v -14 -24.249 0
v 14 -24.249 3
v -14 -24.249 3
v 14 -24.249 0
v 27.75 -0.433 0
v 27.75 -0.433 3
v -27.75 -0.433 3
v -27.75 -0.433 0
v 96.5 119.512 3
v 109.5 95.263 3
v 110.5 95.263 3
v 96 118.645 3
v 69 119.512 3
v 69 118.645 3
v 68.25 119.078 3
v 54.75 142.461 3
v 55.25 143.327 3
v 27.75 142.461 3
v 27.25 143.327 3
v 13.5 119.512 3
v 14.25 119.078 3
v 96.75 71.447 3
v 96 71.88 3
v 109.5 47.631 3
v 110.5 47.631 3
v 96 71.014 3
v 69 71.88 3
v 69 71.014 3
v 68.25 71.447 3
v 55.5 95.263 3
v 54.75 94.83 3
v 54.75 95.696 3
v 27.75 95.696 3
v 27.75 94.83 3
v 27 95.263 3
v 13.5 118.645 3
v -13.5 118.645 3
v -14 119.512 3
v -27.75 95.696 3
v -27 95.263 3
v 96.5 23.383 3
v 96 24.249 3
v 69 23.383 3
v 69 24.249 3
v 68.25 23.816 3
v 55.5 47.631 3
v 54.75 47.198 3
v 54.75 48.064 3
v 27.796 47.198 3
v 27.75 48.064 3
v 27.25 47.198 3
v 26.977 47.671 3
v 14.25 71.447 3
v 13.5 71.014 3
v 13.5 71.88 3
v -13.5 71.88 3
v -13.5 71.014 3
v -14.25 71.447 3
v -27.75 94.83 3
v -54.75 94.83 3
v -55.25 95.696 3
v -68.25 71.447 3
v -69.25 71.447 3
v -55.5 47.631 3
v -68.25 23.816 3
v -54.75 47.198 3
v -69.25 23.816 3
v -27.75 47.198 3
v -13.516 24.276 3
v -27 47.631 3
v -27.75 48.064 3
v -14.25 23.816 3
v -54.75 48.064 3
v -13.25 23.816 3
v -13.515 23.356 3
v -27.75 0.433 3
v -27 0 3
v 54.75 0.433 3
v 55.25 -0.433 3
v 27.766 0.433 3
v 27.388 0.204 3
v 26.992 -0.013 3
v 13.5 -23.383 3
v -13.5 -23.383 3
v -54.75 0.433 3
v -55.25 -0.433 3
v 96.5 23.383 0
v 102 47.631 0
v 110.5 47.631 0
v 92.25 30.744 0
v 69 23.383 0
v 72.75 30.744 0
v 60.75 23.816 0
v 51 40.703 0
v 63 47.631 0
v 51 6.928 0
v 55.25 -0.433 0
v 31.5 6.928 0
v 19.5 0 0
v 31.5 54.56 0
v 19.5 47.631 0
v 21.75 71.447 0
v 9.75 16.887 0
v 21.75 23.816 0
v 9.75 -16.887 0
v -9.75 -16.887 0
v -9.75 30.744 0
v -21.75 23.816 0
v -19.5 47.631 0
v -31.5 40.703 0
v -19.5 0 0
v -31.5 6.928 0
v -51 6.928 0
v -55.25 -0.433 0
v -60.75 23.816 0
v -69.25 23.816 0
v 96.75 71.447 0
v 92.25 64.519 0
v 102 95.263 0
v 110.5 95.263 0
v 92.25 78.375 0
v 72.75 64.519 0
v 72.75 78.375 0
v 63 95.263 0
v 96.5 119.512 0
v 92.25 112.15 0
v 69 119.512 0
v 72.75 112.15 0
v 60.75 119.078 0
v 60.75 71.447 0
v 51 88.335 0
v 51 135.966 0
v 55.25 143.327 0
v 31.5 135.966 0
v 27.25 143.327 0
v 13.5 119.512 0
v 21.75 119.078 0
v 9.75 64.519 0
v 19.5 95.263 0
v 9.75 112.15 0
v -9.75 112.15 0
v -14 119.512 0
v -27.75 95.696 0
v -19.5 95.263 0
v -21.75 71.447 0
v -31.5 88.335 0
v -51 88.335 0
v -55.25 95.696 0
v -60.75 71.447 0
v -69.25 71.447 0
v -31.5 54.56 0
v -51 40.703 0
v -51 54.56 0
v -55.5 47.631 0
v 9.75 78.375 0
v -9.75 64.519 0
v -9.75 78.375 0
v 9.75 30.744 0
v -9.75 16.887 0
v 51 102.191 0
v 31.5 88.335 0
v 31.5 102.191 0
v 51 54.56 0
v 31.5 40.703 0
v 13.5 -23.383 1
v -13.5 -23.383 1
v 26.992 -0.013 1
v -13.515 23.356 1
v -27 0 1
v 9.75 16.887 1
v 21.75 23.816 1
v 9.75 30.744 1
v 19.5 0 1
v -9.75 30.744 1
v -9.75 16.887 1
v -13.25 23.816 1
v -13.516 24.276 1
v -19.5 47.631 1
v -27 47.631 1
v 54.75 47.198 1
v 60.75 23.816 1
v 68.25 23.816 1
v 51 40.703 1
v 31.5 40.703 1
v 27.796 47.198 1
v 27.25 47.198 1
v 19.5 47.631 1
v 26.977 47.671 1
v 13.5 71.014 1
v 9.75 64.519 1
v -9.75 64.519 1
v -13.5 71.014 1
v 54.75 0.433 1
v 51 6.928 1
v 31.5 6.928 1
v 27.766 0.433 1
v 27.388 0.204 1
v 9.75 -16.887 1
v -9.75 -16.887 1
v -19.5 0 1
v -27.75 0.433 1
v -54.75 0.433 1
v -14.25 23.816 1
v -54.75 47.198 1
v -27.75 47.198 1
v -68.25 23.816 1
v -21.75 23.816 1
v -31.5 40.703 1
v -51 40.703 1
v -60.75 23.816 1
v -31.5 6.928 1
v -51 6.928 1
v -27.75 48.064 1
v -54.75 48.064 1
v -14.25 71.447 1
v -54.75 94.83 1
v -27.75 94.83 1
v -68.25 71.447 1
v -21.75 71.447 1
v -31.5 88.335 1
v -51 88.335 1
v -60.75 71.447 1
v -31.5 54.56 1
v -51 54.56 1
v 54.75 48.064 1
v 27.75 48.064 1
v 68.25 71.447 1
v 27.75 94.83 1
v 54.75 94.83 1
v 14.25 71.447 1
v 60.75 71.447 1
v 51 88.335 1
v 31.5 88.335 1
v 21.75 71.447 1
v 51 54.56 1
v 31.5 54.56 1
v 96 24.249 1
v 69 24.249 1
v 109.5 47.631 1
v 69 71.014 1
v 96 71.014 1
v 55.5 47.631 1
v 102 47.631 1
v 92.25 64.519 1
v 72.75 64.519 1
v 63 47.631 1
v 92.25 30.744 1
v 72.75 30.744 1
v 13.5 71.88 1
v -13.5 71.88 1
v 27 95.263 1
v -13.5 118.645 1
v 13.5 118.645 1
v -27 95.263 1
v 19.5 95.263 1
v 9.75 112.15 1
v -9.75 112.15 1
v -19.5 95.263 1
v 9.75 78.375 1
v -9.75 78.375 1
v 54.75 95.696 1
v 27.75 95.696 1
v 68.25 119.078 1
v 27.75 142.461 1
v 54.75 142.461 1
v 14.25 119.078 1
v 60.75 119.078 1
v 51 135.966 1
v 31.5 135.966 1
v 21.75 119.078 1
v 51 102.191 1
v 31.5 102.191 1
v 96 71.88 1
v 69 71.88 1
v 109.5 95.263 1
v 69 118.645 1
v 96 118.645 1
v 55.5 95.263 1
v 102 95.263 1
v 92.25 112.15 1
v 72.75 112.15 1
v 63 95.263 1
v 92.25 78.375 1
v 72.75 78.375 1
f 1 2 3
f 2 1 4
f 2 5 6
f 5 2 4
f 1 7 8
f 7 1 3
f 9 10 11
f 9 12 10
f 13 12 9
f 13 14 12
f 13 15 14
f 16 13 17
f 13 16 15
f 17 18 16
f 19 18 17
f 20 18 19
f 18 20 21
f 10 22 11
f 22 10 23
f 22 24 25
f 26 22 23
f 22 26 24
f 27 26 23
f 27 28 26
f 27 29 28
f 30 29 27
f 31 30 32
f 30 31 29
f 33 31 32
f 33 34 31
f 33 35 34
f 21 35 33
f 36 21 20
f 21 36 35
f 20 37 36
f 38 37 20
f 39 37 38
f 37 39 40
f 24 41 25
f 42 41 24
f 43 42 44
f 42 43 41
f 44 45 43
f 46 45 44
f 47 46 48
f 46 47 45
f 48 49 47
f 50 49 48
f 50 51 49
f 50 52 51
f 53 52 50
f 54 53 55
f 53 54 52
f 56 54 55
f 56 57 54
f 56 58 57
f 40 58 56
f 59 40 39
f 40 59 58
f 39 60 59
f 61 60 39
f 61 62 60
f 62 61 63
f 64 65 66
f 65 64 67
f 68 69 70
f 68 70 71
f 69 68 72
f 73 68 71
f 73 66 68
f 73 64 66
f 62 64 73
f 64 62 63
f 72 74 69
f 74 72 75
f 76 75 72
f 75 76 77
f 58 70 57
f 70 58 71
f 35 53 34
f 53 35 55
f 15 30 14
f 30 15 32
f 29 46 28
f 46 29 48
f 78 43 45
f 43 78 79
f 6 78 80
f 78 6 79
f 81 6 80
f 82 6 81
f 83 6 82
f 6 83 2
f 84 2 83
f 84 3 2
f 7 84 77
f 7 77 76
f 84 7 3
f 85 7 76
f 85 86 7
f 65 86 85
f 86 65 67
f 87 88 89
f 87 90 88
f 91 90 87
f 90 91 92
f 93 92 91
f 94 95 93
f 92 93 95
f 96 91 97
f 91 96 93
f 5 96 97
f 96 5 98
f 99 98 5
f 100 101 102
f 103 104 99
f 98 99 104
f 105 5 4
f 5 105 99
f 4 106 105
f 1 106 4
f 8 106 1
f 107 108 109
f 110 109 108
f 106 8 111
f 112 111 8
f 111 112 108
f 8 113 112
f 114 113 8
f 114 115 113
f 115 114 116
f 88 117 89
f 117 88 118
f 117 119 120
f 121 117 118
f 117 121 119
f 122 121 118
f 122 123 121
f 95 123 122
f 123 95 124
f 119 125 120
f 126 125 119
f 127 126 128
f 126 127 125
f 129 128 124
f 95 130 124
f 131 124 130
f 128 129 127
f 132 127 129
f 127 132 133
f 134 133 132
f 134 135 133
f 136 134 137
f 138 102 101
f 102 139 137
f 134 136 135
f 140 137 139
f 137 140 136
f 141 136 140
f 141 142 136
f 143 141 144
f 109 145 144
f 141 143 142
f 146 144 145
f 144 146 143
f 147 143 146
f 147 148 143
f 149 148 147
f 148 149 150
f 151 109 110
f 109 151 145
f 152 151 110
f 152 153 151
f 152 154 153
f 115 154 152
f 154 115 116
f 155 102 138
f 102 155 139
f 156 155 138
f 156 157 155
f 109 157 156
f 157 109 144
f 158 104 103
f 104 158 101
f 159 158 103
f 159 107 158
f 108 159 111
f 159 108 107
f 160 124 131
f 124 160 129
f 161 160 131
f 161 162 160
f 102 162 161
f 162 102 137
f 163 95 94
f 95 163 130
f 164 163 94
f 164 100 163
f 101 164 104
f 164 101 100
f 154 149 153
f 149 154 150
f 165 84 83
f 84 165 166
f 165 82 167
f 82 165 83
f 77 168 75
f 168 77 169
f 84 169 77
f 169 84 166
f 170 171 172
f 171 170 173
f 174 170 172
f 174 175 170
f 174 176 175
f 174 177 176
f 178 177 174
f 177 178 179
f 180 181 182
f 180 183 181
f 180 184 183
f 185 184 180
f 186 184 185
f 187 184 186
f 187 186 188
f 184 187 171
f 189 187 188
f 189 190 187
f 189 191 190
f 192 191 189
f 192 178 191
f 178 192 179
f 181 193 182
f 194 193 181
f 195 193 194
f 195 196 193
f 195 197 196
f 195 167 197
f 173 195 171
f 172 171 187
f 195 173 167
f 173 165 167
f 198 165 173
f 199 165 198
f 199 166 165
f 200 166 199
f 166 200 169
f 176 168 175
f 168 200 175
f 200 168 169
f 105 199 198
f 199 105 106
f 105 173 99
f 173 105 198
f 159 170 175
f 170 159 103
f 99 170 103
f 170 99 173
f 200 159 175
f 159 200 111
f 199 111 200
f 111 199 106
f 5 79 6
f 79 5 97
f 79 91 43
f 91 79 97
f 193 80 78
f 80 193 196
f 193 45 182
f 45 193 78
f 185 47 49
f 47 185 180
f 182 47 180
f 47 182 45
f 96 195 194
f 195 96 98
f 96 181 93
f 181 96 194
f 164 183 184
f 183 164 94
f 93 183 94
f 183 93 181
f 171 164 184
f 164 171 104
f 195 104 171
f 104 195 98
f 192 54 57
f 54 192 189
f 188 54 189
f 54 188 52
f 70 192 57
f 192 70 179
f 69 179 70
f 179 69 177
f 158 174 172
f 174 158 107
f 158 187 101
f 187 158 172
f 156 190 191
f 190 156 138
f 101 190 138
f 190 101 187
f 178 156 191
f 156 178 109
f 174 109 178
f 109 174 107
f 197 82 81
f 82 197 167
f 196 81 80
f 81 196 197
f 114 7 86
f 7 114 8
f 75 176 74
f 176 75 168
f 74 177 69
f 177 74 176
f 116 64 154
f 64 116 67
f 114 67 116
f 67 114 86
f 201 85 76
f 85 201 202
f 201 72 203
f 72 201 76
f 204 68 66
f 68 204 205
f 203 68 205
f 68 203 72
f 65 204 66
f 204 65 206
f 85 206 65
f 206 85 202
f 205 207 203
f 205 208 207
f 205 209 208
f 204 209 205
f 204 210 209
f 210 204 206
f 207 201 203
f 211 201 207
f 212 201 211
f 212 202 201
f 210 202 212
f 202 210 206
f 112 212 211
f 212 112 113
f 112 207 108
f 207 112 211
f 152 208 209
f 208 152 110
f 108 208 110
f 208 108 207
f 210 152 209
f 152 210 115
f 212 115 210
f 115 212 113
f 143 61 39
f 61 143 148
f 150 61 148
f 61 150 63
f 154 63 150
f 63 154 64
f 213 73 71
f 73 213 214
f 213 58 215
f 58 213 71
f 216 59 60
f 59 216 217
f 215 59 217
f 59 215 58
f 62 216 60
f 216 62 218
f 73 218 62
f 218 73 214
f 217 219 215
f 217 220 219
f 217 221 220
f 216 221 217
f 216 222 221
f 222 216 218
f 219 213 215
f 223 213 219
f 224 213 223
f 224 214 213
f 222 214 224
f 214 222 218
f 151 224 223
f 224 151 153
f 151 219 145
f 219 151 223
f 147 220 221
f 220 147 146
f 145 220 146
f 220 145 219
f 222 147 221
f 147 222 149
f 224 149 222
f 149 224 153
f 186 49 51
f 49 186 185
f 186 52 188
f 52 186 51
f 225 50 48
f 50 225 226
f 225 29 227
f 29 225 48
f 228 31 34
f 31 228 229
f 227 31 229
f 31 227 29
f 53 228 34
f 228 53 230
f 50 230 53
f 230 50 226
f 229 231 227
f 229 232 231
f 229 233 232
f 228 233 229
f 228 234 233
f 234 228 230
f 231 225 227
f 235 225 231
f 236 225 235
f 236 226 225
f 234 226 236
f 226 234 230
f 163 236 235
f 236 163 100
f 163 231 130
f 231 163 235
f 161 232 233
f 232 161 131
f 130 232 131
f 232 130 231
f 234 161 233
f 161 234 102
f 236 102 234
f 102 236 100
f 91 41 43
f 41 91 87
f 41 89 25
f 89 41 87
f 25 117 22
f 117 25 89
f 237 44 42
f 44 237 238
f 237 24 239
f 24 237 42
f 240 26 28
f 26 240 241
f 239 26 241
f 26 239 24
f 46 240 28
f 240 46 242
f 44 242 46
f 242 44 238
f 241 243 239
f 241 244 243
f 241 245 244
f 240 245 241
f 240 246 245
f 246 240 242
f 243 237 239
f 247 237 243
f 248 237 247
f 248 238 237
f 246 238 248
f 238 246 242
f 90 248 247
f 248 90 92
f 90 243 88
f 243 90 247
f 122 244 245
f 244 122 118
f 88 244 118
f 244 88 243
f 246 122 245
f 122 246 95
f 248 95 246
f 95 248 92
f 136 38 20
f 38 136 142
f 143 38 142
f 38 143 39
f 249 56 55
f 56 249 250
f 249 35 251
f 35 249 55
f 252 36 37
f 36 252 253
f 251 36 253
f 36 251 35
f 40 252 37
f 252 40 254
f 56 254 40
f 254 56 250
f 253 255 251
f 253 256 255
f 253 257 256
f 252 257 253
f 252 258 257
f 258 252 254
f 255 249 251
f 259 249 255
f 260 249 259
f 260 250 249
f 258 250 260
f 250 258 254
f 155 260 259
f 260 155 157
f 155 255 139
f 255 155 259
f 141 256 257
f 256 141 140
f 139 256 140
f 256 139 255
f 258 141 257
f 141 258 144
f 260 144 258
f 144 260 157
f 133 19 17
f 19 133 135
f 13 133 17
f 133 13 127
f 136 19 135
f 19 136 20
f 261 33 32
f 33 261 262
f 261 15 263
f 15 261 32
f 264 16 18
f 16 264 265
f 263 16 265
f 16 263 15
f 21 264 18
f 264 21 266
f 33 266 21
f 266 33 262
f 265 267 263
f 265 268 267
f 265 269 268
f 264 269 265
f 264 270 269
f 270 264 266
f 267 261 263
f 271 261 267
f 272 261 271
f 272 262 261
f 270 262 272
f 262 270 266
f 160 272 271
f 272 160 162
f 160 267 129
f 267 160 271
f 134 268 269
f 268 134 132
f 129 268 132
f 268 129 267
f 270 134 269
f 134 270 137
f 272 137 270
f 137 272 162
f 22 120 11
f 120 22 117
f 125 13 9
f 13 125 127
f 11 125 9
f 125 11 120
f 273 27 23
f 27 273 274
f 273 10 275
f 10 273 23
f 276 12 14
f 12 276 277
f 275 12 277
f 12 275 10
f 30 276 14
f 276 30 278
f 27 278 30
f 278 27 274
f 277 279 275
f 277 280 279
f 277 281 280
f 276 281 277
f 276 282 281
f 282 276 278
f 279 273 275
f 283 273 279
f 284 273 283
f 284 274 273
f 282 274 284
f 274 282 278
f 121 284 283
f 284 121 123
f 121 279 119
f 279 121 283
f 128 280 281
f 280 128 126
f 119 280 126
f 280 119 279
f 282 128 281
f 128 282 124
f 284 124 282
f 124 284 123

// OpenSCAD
$fn = 150;

union() {
	difference() {
		union() {
			translate(v = [0.0, 0.0, 0]) {
				difference() {
					cylinder($fn = 6, d = 56.0, h = 3.0);
					translate(v = [0, 0, 1.0]) {
						cylinder($fn = 6, d = 54.0, h = 3.0);
					}
					translate(v = [0, 0, -1]) {
						cylinder($fn = 6, d = 39, h = 3.0);
					}
				}
			}
			translate(v = [41.25, 23.81569860407206, 0]) {
				difference() {
					cylinder($fn = 6, d = 56.0, h = 3.0);
					translate(v = [0, 0, 1.0]) {
						cylinder($fn = 6, d = 54.0, h = 3.0);
					}
					translate(v = [0, 0, -1]) {
						cylinder($fn = 6, d = 39, h = 3.0);
					}
				}
			}
			translate(v = [0.0, 47.63139720814412, 0]) {
				difference() {
					cylinder($fn = 6, d = 56.0, h = 3.0);
					translate(v = [0, 0, 1.0]) {
						cylinder($fn = 6, d = 54.0, h = 3.0);
					}
					translate(v = [0, 0, -1]) {
						cylinder($fn = 6, d = 39, h = 3.0);
					}
				}
			}
		}
		translate(v = [13.75, 23.824673200287624, 1.0]) {
			cylinder(d = 54.55, h = 3.0);
		}
	}
	translate(v = [-41.25, 23.81569860407206, 0]) {
		difference() {
			cylinder($fn = 6, d = 56.0, h = 3.0);
			translate(v = [0, 0, 1.0]) {
				cylinder($fn = 6, d = 54.0, h = 3.0);
			}
			translate(v = [0, 0, -1]) {
				cylinder($fn = 6, d = 39, h = 3.0);
			}
		}
	}
	translate(v = [-41.25, 71.44709581221619, 0]) {
		difference() {
			cylinder($fn = 6, d = 56.0, h = 3.0);
			translate(v = [0, 0, 1.0]) {
				cylinder($fn = 6, d = 54.0, h = 3.0);
			}
			translate(v = [0, 0, -1]) {
				cylinder($fn = 6, d = 39, h = 3.0);
			}
		}
	}
	translate(v = [41.25, 71.44709581221619, 0]) {
		difference() {
			cylinder($fn = 6, d = 56.0, h = 3.0);
			translate(v = [0, 0, 1.0]) {
				cylinder($fn = 6, d = 54.0, h = 3.0);
			}
			translate(v = [0, 0, -1]) {
				cylinder($fn = 6, d = 39, h = 3.0);
			}
		}
	}
	translate(v = [82.5, 47.63139720814412, 0]) {
		difference() {
			cylinder($fn = 6, d = 56.0, h = 3.0);
			translate(v = [0, 0, 1.0]) {
				cylinder($fn = 6, d = 54.0, h = 3.0);
			}
			translate(v = [0, 0, -1]) {
				cylinder($fn = 6, d = 39, h = 3.0);
			}
		}
	}
	translate(v = [0.0, 95.26279441628824, 0]) {
		difference() {
			cylinder($fn = 6, d = 56.0, h = 3.0);
			translate(v = [0, 0, 1.0]) {
				cylinder($fn = 6, d = 54.0, h = 3.0);
			}
			translate(v = [0, 0, -1]) {
				cylinder($fn = 6, d = 39, h = 3.0);
			}
		}
	}
	translate(v = [41.25, 119.0784930203603, 0]) {
		difference() {
			cylinder($fn = 6, d = 56.0, h = 3.0);
			translate(v = [0, 0, 1.0]) {
				cylinder($fn = 6, d = 54.0, h = 3.0);
			}
			translate(v = [0, 0, -1]) {
				cylinder($fn = 6, d = 39, h = 3.0);
			}
		}
	}
	translate(v = [82.5, 95.26279441628824, 0]) {
		difference() {
			cylinder($fn = 6, d = 56.0, h = 3.0);
			translate(v = [0, 0, 1.0]) {
				cylinder($fn = 6, d = 54.0, h = 3.0);
			}
			translate(v = [0, 0, -1]) {
				cylinder($fn = 6, d = 39, h = 3.0);
			}
		}
	}
}
